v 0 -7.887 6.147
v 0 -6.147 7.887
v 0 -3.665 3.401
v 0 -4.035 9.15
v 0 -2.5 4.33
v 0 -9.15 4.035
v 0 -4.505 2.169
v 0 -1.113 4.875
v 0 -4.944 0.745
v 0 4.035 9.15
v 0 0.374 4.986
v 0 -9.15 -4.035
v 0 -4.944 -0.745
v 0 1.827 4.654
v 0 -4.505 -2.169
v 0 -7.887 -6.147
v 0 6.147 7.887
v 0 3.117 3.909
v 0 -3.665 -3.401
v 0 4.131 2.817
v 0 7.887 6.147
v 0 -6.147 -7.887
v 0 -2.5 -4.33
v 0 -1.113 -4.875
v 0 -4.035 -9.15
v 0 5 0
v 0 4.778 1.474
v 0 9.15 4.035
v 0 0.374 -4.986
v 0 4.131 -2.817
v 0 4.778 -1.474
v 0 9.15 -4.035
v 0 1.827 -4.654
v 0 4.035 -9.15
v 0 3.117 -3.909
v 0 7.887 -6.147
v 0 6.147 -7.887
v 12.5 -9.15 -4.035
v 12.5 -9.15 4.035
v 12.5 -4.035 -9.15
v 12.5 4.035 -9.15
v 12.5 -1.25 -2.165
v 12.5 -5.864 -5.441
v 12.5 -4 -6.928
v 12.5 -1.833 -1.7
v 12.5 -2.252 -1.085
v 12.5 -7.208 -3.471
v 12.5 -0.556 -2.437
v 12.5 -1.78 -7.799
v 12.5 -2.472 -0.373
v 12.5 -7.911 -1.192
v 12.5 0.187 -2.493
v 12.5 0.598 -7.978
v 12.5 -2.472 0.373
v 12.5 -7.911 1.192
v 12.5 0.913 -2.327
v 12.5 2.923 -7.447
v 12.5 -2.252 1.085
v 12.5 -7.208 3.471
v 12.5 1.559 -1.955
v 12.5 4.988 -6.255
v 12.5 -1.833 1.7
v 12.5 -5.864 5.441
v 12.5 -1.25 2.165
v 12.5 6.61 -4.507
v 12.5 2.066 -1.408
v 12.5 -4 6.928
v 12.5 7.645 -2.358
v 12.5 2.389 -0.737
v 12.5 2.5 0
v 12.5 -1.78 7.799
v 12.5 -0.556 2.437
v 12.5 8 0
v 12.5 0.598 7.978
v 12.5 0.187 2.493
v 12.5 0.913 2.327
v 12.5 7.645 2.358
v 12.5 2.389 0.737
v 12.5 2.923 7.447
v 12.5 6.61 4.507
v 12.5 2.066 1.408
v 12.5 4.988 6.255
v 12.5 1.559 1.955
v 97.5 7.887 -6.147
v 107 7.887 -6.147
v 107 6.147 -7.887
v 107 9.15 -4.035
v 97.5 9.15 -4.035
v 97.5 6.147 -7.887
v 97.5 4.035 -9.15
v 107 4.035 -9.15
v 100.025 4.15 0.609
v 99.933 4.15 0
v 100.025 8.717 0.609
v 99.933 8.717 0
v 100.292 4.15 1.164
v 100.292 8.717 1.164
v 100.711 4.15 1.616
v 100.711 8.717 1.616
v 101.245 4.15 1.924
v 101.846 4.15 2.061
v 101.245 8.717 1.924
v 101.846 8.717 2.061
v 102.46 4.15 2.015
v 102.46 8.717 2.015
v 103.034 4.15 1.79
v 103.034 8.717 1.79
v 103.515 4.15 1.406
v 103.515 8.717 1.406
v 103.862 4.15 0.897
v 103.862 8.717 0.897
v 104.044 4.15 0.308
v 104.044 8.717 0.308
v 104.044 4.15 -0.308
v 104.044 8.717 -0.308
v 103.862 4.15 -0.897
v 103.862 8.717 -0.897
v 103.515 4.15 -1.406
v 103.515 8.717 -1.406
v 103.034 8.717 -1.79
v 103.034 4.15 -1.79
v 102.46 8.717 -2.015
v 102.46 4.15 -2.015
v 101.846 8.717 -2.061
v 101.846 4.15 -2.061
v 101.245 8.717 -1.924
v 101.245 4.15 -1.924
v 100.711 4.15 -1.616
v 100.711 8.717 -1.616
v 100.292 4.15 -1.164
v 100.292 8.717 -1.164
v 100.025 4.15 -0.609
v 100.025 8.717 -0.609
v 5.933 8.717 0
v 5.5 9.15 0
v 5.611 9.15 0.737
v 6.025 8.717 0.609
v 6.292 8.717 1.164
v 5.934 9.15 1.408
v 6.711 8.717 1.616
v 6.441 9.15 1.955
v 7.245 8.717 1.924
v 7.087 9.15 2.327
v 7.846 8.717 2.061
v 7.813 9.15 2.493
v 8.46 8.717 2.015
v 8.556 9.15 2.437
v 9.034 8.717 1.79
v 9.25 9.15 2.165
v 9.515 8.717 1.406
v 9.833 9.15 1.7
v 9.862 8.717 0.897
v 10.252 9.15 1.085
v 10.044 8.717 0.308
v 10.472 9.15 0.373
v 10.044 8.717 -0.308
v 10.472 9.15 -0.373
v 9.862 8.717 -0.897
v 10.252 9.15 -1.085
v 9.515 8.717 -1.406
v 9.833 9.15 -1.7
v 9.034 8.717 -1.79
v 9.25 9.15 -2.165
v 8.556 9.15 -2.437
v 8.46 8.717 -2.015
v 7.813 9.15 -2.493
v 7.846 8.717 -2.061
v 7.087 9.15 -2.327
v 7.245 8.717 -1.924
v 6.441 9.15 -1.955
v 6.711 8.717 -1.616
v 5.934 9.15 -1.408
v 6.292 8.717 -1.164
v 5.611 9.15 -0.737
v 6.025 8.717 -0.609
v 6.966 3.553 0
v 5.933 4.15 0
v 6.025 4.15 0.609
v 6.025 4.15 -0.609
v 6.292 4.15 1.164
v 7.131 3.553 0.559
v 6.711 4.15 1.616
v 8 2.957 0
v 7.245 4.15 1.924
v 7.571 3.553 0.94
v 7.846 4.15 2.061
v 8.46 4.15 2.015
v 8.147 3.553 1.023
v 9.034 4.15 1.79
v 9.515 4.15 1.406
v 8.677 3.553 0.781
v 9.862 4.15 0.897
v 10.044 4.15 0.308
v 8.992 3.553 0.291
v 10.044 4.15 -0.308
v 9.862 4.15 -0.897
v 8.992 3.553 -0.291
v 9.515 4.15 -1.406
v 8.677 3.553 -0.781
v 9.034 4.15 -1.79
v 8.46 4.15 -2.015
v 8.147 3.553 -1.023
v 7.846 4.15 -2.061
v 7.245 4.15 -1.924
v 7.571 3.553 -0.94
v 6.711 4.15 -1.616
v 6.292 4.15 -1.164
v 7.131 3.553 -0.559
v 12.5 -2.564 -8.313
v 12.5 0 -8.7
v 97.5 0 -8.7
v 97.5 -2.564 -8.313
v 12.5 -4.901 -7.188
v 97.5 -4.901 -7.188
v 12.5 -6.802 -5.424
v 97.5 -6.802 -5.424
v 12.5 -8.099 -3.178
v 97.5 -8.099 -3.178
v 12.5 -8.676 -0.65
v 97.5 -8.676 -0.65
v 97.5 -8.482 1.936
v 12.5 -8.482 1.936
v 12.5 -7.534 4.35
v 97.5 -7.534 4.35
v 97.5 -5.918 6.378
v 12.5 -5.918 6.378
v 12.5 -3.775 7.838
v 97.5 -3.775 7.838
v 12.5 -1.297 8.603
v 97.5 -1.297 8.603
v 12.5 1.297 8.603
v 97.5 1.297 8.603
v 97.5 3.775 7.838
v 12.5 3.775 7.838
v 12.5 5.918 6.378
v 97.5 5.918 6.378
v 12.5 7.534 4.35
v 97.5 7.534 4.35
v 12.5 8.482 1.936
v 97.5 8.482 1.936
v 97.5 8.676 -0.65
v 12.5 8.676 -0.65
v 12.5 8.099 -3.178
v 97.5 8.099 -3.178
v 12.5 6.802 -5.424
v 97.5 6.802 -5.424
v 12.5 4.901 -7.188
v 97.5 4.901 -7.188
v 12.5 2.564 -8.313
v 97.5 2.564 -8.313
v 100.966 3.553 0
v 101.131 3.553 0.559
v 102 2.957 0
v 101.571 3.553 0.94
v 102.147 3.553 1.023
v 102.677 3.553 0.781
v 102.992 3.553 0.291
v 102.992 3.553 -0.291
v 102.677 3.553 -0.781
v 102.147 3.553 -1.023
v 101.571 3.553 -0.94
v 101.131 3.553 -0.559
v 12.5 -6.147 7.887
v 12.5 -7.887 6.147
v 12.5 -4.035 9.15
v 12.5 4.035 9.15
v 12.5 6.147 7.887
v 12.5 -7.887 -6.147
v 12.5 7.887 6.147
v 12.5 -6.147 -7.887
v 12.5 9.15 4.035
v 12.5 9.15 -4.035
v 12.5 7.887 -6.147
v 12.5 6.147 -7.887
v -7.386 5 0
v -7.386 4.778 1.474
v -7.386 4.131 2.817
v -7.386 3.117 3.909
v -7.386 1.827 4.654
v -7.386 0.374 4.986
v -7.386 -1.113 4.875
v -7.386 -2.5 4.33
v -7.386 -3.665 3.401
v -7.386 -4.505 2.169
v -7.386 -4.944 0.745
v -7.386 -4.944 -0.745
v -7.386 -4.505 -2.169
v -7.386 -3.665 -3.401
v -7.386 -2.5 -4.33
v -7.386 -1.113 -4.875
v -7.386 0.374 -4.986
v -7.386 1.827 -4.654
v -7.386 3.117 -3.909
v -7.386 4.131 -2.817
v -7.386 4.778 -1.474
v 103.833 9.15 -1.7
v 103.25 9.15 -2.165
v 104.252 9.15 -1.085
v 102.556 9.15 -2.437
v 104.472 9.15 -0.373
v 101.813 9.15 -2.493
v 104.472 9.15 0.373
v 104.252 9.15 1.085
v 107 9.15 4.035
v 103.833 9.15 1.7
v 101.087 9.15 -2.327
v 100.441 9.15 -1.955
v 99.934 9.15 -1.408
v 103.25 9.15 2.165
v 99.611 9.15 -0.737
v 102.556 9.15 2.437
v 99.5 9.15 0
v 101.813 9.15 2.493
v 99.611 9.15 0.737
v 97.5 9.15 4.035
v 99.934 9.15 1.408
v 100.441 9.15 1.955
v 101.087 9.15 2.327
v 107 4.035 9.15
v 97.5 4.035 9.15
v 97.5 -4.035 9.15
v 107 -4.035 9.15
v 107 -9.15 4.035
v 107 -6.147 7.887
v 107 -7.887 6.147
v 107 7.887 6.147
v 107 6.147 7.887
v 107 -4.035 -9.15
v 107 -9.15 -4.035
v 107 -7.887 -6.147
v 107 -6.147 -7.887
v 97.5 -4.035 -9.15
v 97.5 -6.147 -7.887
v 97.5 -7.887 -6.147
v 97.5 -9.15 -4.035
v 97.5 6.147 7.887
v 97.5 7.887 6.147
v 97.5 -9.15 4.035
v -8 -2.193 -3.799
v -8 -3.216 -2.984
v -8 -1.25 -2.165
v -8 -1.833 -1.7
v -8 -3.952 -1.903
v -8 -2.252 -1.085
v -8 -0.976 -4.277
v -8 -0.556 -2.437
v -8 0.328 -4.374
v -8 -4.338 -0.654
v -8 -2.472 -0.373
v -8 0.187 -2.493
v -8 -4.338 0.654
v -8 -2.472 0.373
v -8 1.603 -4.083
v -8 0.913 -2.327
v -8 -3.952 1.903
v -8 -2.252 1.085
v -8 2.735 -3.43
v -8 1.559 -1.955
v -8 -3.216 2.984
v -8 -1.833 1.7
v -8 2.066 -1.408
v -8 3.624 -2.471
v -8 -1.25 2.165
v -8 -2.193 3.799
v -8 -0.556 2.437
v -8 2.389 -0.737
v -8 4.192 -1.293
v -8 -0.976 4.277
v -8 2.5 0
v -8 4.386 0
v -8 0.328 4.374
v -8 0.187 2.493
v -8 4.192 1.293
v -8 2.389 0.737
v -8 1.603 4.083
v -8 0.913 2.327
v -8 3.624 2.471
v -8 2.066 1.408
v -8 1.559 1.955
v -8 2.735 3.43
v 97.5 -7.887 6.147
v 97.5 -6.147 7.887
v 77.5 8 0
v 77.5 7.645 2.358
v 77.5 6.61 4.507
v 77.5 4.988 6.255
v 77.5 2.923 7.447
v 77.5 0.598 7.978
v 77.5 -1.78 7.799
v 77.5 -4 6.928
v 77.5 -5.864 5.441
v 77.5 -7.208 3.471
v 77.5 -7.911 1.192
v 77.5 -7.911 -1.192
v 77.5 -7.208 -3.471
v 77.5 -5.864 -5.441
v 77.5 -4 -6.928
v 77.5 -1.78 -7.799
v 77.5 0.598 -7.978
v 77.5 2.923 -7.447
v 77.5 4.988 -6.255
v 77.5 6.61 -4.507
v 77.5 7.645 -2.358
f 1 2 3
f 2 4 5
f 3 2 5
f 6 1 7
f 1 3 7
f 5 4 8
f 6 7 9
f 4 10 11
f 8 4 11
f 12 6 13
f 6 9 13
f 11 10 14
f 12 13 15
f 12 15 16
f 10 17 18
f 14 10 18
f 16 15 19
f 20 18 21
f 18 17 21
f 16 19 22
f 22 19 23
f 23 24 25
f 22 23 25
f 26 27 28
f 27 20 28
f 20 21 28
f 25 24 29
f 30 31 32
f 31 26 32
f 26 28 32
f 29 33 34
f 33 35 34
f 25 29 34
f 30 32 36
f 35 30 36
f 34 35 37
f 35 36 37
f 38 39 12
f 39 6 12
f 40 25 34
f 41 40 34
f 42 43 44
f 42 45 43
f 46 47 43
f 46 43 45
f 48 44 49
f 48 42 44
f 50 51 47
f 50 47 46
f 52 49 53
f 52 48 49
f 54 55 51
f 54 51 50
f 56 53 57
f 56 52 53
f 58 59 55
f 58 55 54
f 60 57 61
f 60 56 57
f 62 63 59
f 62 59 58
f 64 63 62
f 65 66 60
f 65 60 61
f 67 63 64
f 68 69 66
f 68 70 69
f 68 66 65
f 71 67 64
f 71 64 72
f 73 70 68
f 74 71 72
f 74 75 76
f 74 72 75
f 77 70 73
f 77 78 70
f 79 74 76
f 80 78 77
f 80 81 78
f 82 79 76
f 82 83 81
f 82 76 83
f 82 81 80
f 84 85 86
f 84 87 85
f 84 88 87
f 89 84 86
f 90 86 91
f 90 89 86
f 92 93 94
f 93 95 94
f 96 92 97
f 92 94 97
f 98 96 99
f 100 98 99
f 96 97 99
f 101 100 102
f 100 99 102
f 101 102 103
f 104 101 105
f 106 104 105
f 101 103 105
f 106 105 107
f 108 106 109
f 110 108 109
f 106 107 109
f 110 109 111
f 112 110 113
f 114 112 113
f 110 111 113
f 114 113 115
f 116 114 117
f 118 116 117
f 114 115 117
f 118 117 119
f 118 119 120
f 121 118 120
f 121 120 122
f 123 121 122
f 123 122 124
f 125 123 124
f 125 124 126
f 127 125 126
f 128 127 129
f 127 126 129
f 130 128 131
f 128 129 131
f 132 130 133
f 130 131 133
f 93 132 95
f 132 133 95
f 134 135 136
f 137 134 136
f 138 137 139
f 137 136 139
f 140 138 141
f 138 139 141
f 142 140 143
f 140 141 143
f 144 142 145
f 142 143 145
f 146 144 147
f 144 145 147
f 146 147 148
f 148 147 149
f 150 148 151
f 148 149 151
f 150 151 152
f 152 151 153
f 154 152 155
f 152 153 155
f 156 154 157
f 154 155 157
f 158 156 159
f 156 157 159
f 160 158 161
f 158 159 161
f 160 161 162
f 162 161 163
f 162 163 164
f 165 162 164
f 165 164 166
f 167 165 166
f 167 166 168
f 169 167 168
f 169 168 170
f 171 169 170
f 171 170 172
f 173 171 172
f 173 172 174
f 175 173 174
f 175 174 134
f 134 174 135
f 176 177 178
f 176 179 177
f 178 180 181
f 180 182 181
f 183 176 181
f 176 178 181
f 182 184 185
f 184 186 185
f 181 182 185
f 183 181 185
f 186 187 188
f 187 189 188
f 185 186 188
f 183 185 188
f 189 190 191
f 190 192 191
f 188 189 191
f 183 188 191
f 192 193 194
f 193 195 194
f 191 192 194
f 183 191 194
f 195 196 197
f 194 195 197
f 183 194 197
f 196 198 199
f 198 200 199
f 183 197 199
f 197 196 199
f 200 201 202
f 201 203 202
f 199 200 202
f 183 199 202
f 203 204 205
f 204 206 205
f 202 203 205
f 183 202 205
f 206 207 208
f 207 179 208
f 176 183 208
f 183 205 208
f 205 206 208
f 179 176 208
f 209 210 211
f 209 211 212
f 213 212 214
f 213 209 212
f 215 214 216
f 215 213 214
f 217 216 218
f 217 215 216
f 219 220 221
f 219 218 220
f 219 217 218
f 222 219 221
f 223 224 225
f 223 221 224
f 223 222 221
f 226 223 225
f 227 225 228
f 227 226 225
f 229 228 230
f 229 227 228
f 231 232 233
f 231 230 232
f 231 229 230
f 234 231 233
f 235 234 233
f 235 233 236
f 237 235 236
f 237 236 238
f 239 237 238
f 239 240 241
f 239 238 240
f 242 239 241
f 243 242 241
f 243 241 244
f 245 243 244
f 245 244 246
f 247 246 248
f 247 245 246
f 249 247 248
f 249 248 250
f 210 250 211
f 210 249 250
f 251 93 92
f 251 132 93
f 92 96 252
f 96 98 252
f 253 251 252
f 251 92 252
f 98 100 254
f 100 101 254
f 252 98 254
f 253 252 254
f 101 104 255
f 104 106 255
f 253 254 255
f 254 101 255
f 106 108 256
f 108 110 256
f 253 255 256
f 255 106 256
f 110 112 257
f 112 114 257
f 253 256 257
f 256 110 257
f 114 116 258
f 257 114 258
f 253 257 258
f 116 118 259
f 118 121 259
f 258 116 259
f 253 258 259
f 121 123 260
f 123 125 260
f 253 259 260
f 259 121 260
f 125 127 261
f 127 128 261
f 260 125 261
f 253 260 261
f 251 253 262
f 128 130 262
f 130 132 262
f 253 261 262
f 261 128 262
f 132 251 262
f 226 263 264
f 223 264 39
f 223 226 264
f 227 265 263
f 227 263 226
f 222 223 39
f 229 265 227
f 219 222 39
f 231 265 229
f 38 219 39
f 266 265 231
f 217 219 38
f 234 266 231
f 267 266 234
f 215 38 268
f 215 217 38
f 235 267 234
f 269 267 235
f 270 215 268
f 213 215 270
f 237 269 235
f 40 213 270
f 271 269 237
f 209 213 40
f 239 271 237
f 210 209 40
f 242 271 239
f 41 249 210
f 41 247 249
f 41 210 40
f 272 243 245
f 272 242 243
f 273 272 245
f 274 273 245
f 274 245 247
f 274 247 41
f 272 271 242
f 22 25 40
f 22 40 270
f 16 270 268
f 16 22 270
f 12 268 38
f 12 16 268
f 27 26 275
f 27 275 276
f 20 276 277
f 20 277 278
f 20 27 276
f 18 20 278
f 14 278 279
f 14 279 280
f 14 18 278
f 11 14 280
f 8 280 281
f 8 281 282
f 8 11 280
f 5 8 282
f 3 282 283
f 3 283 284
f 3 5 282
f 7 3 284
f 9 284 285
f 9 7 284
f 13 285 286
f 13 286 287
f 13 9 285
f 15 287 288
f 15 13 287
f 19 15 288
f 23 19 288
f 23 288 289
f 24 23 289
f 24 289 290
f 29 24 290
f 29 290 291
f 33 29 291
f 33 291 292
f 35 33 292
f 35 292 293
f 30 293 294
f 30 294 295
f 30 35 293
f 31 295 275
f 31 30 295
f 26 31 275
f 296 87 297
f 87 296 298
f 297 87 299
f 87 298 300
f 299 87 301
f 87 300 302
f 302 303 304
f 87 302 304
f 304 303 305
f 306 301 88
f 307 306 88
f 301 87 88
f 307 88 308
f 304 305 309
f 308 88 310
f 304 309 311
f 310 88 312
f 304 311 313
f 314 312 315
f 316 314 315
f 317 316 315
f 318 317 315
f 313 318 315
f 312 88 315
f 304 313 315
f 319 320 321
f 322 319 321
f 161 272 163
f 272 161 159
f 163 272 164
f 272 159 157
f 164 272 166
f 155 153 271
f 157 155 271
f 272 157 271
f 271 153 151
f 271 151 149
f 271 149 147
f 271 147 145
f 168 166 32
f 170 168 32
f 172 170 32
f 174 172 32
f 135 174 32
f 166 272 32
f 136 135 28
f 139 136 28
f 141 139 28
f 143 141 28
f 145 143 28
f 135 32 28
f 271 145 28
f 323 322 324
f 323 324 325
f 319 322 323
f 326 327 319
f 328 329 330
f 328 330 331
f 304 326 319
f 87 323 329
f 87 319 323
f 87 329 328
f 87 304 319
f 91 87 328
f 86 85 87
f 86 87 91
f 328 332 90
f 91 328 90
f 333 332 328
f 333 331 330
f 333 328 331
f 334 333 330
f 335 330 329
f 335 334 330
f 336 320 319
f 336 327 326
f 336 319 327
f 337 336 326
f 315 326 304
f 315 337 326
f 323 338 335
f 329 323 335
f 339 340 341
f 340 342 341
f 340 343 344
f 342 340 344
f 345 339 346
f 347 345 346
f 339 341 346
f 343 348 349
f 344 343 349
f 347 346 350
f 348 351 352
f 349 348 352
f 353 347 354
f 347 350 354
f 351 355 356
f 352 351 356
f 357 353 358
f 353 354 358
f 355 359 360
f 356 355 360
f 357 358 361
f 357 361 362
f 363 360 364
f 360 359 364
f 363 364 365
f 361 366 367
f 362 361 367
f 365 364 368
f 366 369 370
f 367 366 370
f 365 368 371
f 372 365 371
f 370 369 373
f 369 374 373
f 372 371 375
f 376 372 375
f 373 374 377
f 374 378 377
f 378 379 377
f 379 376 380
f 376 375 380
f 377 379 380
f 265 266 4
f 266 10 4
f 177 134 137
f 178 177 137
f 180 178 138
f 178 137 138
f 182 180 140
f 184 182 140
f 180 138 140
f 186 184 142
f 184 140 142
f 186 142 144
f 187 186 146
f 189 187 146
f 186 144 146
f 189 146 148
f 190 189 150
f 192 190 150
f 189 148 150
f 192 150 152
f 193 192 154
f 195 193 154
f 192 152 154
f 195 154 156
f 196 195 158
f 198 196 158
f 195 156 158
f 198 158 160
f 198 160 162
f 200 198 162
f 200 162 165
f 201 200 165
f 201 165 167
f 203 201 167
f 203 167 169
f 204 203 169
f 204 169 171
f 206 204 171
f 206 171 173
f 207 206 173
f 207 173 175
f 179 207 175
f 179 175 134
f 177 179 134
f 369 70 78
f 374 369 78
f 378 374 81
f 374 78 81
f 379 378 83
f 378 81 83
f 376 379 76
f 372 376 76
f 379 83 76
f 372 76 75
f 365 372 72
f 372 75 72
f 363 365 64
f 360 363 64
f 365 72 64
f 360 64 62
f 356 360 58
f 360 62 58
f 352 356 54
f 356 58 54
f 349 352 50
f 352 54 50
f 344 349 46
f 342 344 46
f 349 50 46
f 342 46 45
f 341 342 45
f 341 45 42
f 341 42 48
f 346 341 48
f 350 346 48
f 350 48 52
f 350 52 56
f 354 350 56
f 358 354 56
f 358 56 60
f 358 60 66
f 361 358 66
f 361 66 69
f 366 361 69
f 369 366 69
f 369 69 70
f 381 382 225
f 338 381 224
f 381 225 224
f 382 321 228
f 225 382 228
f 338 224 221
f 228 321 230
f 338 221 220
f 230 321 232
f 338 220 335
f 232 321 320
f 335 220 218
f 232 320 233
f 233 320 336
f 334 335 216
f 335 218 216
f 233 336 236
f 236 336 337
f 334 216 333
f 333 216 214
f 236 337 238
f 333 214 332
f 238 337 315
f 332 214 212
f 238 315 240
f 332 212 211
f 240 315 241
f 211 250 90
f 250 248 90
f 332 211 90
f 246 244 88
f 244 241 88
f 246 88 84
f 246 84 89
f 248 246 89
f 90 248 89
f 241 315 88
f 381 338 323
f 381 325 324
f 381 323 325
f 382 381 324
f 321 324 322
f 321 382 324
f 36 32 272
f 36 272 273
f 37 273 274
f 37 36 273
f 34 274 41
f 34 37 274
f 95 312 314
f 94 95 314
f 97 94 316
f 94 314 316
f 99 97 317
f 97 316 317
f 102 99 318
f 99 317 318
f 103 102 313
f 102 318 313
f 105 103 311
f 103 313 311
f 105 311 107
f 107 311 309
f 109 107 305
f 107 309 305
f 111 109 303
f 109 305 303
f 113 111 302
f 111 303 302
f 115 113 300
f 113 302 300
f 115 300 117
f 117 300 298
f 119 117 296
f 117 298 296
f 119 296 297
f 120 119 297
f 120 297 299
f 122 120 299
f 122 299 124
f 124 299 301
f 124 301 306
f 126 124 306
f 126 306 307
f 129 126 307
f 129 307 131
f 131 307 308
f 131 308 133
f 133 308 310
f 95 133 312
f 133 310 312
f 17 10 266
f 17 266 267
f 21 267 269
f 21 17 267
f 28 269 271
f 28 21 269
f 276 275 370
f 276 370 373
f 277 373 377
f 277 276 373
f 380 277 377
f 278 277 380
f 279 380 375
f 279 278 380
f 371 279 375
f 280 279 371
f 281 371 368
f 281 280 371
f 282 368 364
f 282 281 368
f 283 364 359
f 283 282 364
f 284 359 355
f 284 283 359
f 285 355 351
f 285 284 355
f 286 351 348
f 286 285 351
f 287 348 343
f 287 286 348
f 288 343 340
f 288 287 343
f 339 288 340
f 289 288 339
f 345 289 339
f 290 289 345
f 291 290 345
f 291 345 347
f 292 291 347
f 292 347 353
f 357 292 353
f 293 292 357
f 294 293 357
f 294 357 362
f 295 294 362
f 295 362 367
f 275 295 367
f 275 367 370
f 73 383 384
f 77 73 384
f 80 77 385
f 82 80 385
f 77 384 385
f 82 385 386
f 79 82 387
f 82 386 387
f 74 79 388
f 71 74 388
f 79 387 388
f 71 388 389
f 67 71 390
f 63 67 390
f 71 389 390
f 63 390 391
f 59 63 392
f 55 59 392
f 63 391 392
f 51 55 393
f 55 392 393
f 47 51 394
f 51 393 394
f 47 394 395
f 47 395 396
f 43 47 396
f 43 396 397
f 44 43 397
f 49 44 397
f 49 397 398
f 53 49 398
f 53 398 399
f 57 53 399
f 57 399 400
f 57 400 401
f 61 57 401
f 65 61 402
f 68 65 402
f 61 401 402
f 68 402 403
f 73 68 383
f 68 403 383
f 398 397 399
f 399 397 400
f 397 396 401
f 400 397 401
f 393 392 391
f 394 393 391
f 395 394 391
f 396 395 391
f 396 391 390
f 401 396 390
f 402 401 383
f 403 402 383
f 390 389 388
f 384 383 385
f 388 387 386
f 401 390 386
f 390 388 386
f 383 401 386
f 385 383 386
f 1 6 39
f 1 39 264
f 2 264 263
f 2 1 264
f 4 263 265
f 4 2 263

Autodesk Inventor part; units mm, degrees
sketch "Sketch_8" plane through (0, 0, 0) normal (0, 0, 1) x (1, 0, 0)
  line L0 (0, 0) -> (-8, 0)
  line L1 (-8, 0) -> (-8, 4.3865)
  line L2 (-8, 4.3865) -> (-7.3865, 5)
  line L3 (-7.3865, 5) -> (0, 5)
  line L4 (0, 5) -> (0, 0)
  line L5 (0, 0) -> (-8, 0)
revolve "Revolution1" add sketch "Sketch_8" angle 360 about axis through (0, 0, 0) along (1, 0, 0)
thread "Thread1" size "M10x1" class "6g" standard "ISO Metric profile" length 5.8865
sketch "Sketch_9" plane through (0, 0, 0) normal (1, 0, 0) x (0, 0, -1)
  line L0 (-9.15, 4.0345) -> (-9.15, -4.0345)
  arc A0 (-9.15, -4.0345) -> (-4.0345, -9.15) centre (0, 0) ccw
  line L1 (-4.0345, -9.15) -> (4.0345, -9.15)
  arc A1 (4.0345, -9.15) -> (9.15, -4.0345) centre (0, 0) ccw
  line L2 (9.15, -4.0345) -> (9.15, 4.0345)
  arc A2 (9.15, 4.0345) -> (4.0345, 9.15) centre (0, 0) ccw
  line L3 (4.0345, 9.15) -> (-4.0345, 9.15)
  arc A3 (-4.0345, 9.15) -> (-9.15, 4.0345) centre (0, 0) ccw
extrude "Extrusion1" add sketch "Sketch_9" along normal blind 12.5
sketch "Sketch_11" plane through (12.5, 0, 0) normal (1, 0, 0) x (0, 0, -1)
  circle A0 centre (0, 0) radius 8.7
extrude "Extrusion2" add sketch "Sketch_11" along normal blind 85
sketch "Sketch_10" plane through (97.5, 0, 0) normal (1, 0, 0) x (0, 0, -1)
  line L0 (-9.15, 4.0345) -> (-9.15, -4.0345)
  arc A0 (-9.15, -4.0345) -> (-4.0345, -9.15) centre (0, 0) ccw
  line L1 (-4.0345, -9.15) -> (4.0345, -9.15)
  arc A1 (4.0345, -9.15) -> (9.15, -4.0345) centre (0, 0) ccw
  line L2 (9.15, -4.0345) -> (9.15, 4.0345)
  arc A2 (9.15, 4.0345) -> (4.0345, 9.15) centre (0, 0) ccw
  line L3 (4.0345, 9.15) -> (-4.0345, 9.15)
  arc A3 (-4.0345, 9.15) -> (-9.15, 4.0345) centre (0, 0) ccw
extrude "Extrusion3" add sketch "Sketch_10" along normal blind 9.5
sketch "Sketch7" plane through (0, 0, 0) normal (0, 0, 1) x (1, 0, 0)
  line L0 (8, 9.15) -> (8, 4.15)
  line L1 (8, 2.9566) -> (5.933, 4.15)
  line L2 (5.933, 4.15) -> (5.933, 8.717)
  line L3 (5.933, 8.717) -> (5.5, 9.15)
  line L4 (5.5, 9.15) -> (8, 9.15)
  line L5 (8, 9.15) -> (8, 2.9566)
revolve "Revolution2" cut sketch "Sketch7" angle 360 about axis through (8, 9.15, 0) along (0, 1, 0)
thread "Thread2" size "M5x0.8" class "6H" standard "ISO Metric profile" full length
sketch "Sketch_7" plane through (0, 0, 0) normal (0, 0, 1) x (1, 0, 0)
  line L0 (102, 9.15) -> (102, 4.15)
  line L1 (102, 2.9566) -> (99.933, 4.15)
  line L2 (99.933, 4.15) -> (99.933, 8.717)
  line L3 (99.933, 8.717) -> (99.5, 9.15)
  line L4 (99.5, 9.15) -> (102, 9.15)
  line L5 (102, 9.15) -> (102, 2.9566)
revolve "Revolution3" cut sketch "Sketch_7" angle 360 about axis through (102, 9.15, 0) along (0, 1, 0)
thread "Thread3" size "M5x0.8" class "6H" standard "ISO Metric profile" full length
sketch "Sketch_16" plane through (0, 0, 0) normal (0, 0, 1) x (1, 0, 0)
  line L0 (77.5, 0) -> (-8, 0)
  line L1 (-8, 0) -> (-8, 2.5)
  line L2 (-8, 2.5) -> (12.5, 2.5)
  line L3 (12.5, 2.5) -> (12.5, 8)
  line L4 (12.5, 8) -> (77.5, 8)
  line L5 (77.5, 8) -> (77.5, 0)
  line L6 (77.5, 0) -> (-8, 0)
revolve "Revolution4" cut sketch "Sketch_16" angle 360 about axis through (77.5, 0, 0) along (1, 0, 0)
ref_plane "BODY_N_XY" through (107, 0, 0) normal (0, 0, -1) x (1, 0, 0)
ref_plane "BODY_N_YZ" through (107, 0, 0) normal (1, 0, 0) x (0, -1, 0)
ref_plane "BODY_N_ZX" through (107, 0, 0) normal (0, -1, 0) x (0, 0, -1)
ref_plane "NUT2_XY" through (107, 0, 0) normal (1, 0, 0) x (0, 0, -1)
ref_plane "NUT2_YZ" through (107, 0, 0) normal (0, 0, -1) x (0, 1, 0)
ref_plane "NUT2_ZX" through (107, 0, 0) normal (0, 1, 0) x (1, 0, 0)
ref_plane "SW1_XY" through (17.5, 0, 0) normal (1, 0, 0) x (0, 0, -1)
ref_plane "SW1_YZ" through (17.5, 0, 0) normal (0, 0, -1) x (0, 1, 0)
ref_plane "SW1_ZX" through (17.5, 0, 0) normal (0, 1, 0) x (1, 0, 0)
ref_plane "SW2_XY" through (92.5, 0, 0) normal (-1, 0, 0) x (0, 0, -1)
ref_plane "SW2_YZ" through (92.5, 0, 0) normal (0, 0, -1) x (0, -1, 0)
ref_plane "SW2_ZX" through (92.5, 0, 0) normal (0, -1, 0) x (-1, 0, 0)
ref_plane "SW_R1_XY" through (17.5, -14.15, 0) normal (1, 0, 0) x (0, 0, -1)
ref_plane "SW_R1_YZ" through (17.5, -14.15, 0) normal (0, 0, -1) x (0, 1, 0)
ref_plane "SW_R1_ZX" through (17.5, -14.15, 0) normal (0, 1, 0) x (1, 0, 0)
ref_plane "SW_R2_XY" through (92.5, -14.15, 0) normal (-1, 0, 0) x (0, 0, -1)
ref_plane "SW_R2_YZ" through (92.5, -14.15, 0) normal (0, 0, -1) x (0, -1, 0)
ref_plane "SW_R2_ZX" through (92.5, -14.15, 0) normal (0, -1, 0) x (-1, 0, 0)
ref_plane "body_XY" through (0, 0, 0) normal (1, 0, 0) x (0, 0, -1)
ref_plane "body_YZ" through (0, 0, 0) normal (0, 0, -1) x (0, 1, 0)
ref_plane "body_ZX" through (0, 0, 0) normal (0, 1, 0) x (1, 0, 0)
properties part number "CJ2B16-60Z(1_0)_BODY" material "ステンレス鋼"
